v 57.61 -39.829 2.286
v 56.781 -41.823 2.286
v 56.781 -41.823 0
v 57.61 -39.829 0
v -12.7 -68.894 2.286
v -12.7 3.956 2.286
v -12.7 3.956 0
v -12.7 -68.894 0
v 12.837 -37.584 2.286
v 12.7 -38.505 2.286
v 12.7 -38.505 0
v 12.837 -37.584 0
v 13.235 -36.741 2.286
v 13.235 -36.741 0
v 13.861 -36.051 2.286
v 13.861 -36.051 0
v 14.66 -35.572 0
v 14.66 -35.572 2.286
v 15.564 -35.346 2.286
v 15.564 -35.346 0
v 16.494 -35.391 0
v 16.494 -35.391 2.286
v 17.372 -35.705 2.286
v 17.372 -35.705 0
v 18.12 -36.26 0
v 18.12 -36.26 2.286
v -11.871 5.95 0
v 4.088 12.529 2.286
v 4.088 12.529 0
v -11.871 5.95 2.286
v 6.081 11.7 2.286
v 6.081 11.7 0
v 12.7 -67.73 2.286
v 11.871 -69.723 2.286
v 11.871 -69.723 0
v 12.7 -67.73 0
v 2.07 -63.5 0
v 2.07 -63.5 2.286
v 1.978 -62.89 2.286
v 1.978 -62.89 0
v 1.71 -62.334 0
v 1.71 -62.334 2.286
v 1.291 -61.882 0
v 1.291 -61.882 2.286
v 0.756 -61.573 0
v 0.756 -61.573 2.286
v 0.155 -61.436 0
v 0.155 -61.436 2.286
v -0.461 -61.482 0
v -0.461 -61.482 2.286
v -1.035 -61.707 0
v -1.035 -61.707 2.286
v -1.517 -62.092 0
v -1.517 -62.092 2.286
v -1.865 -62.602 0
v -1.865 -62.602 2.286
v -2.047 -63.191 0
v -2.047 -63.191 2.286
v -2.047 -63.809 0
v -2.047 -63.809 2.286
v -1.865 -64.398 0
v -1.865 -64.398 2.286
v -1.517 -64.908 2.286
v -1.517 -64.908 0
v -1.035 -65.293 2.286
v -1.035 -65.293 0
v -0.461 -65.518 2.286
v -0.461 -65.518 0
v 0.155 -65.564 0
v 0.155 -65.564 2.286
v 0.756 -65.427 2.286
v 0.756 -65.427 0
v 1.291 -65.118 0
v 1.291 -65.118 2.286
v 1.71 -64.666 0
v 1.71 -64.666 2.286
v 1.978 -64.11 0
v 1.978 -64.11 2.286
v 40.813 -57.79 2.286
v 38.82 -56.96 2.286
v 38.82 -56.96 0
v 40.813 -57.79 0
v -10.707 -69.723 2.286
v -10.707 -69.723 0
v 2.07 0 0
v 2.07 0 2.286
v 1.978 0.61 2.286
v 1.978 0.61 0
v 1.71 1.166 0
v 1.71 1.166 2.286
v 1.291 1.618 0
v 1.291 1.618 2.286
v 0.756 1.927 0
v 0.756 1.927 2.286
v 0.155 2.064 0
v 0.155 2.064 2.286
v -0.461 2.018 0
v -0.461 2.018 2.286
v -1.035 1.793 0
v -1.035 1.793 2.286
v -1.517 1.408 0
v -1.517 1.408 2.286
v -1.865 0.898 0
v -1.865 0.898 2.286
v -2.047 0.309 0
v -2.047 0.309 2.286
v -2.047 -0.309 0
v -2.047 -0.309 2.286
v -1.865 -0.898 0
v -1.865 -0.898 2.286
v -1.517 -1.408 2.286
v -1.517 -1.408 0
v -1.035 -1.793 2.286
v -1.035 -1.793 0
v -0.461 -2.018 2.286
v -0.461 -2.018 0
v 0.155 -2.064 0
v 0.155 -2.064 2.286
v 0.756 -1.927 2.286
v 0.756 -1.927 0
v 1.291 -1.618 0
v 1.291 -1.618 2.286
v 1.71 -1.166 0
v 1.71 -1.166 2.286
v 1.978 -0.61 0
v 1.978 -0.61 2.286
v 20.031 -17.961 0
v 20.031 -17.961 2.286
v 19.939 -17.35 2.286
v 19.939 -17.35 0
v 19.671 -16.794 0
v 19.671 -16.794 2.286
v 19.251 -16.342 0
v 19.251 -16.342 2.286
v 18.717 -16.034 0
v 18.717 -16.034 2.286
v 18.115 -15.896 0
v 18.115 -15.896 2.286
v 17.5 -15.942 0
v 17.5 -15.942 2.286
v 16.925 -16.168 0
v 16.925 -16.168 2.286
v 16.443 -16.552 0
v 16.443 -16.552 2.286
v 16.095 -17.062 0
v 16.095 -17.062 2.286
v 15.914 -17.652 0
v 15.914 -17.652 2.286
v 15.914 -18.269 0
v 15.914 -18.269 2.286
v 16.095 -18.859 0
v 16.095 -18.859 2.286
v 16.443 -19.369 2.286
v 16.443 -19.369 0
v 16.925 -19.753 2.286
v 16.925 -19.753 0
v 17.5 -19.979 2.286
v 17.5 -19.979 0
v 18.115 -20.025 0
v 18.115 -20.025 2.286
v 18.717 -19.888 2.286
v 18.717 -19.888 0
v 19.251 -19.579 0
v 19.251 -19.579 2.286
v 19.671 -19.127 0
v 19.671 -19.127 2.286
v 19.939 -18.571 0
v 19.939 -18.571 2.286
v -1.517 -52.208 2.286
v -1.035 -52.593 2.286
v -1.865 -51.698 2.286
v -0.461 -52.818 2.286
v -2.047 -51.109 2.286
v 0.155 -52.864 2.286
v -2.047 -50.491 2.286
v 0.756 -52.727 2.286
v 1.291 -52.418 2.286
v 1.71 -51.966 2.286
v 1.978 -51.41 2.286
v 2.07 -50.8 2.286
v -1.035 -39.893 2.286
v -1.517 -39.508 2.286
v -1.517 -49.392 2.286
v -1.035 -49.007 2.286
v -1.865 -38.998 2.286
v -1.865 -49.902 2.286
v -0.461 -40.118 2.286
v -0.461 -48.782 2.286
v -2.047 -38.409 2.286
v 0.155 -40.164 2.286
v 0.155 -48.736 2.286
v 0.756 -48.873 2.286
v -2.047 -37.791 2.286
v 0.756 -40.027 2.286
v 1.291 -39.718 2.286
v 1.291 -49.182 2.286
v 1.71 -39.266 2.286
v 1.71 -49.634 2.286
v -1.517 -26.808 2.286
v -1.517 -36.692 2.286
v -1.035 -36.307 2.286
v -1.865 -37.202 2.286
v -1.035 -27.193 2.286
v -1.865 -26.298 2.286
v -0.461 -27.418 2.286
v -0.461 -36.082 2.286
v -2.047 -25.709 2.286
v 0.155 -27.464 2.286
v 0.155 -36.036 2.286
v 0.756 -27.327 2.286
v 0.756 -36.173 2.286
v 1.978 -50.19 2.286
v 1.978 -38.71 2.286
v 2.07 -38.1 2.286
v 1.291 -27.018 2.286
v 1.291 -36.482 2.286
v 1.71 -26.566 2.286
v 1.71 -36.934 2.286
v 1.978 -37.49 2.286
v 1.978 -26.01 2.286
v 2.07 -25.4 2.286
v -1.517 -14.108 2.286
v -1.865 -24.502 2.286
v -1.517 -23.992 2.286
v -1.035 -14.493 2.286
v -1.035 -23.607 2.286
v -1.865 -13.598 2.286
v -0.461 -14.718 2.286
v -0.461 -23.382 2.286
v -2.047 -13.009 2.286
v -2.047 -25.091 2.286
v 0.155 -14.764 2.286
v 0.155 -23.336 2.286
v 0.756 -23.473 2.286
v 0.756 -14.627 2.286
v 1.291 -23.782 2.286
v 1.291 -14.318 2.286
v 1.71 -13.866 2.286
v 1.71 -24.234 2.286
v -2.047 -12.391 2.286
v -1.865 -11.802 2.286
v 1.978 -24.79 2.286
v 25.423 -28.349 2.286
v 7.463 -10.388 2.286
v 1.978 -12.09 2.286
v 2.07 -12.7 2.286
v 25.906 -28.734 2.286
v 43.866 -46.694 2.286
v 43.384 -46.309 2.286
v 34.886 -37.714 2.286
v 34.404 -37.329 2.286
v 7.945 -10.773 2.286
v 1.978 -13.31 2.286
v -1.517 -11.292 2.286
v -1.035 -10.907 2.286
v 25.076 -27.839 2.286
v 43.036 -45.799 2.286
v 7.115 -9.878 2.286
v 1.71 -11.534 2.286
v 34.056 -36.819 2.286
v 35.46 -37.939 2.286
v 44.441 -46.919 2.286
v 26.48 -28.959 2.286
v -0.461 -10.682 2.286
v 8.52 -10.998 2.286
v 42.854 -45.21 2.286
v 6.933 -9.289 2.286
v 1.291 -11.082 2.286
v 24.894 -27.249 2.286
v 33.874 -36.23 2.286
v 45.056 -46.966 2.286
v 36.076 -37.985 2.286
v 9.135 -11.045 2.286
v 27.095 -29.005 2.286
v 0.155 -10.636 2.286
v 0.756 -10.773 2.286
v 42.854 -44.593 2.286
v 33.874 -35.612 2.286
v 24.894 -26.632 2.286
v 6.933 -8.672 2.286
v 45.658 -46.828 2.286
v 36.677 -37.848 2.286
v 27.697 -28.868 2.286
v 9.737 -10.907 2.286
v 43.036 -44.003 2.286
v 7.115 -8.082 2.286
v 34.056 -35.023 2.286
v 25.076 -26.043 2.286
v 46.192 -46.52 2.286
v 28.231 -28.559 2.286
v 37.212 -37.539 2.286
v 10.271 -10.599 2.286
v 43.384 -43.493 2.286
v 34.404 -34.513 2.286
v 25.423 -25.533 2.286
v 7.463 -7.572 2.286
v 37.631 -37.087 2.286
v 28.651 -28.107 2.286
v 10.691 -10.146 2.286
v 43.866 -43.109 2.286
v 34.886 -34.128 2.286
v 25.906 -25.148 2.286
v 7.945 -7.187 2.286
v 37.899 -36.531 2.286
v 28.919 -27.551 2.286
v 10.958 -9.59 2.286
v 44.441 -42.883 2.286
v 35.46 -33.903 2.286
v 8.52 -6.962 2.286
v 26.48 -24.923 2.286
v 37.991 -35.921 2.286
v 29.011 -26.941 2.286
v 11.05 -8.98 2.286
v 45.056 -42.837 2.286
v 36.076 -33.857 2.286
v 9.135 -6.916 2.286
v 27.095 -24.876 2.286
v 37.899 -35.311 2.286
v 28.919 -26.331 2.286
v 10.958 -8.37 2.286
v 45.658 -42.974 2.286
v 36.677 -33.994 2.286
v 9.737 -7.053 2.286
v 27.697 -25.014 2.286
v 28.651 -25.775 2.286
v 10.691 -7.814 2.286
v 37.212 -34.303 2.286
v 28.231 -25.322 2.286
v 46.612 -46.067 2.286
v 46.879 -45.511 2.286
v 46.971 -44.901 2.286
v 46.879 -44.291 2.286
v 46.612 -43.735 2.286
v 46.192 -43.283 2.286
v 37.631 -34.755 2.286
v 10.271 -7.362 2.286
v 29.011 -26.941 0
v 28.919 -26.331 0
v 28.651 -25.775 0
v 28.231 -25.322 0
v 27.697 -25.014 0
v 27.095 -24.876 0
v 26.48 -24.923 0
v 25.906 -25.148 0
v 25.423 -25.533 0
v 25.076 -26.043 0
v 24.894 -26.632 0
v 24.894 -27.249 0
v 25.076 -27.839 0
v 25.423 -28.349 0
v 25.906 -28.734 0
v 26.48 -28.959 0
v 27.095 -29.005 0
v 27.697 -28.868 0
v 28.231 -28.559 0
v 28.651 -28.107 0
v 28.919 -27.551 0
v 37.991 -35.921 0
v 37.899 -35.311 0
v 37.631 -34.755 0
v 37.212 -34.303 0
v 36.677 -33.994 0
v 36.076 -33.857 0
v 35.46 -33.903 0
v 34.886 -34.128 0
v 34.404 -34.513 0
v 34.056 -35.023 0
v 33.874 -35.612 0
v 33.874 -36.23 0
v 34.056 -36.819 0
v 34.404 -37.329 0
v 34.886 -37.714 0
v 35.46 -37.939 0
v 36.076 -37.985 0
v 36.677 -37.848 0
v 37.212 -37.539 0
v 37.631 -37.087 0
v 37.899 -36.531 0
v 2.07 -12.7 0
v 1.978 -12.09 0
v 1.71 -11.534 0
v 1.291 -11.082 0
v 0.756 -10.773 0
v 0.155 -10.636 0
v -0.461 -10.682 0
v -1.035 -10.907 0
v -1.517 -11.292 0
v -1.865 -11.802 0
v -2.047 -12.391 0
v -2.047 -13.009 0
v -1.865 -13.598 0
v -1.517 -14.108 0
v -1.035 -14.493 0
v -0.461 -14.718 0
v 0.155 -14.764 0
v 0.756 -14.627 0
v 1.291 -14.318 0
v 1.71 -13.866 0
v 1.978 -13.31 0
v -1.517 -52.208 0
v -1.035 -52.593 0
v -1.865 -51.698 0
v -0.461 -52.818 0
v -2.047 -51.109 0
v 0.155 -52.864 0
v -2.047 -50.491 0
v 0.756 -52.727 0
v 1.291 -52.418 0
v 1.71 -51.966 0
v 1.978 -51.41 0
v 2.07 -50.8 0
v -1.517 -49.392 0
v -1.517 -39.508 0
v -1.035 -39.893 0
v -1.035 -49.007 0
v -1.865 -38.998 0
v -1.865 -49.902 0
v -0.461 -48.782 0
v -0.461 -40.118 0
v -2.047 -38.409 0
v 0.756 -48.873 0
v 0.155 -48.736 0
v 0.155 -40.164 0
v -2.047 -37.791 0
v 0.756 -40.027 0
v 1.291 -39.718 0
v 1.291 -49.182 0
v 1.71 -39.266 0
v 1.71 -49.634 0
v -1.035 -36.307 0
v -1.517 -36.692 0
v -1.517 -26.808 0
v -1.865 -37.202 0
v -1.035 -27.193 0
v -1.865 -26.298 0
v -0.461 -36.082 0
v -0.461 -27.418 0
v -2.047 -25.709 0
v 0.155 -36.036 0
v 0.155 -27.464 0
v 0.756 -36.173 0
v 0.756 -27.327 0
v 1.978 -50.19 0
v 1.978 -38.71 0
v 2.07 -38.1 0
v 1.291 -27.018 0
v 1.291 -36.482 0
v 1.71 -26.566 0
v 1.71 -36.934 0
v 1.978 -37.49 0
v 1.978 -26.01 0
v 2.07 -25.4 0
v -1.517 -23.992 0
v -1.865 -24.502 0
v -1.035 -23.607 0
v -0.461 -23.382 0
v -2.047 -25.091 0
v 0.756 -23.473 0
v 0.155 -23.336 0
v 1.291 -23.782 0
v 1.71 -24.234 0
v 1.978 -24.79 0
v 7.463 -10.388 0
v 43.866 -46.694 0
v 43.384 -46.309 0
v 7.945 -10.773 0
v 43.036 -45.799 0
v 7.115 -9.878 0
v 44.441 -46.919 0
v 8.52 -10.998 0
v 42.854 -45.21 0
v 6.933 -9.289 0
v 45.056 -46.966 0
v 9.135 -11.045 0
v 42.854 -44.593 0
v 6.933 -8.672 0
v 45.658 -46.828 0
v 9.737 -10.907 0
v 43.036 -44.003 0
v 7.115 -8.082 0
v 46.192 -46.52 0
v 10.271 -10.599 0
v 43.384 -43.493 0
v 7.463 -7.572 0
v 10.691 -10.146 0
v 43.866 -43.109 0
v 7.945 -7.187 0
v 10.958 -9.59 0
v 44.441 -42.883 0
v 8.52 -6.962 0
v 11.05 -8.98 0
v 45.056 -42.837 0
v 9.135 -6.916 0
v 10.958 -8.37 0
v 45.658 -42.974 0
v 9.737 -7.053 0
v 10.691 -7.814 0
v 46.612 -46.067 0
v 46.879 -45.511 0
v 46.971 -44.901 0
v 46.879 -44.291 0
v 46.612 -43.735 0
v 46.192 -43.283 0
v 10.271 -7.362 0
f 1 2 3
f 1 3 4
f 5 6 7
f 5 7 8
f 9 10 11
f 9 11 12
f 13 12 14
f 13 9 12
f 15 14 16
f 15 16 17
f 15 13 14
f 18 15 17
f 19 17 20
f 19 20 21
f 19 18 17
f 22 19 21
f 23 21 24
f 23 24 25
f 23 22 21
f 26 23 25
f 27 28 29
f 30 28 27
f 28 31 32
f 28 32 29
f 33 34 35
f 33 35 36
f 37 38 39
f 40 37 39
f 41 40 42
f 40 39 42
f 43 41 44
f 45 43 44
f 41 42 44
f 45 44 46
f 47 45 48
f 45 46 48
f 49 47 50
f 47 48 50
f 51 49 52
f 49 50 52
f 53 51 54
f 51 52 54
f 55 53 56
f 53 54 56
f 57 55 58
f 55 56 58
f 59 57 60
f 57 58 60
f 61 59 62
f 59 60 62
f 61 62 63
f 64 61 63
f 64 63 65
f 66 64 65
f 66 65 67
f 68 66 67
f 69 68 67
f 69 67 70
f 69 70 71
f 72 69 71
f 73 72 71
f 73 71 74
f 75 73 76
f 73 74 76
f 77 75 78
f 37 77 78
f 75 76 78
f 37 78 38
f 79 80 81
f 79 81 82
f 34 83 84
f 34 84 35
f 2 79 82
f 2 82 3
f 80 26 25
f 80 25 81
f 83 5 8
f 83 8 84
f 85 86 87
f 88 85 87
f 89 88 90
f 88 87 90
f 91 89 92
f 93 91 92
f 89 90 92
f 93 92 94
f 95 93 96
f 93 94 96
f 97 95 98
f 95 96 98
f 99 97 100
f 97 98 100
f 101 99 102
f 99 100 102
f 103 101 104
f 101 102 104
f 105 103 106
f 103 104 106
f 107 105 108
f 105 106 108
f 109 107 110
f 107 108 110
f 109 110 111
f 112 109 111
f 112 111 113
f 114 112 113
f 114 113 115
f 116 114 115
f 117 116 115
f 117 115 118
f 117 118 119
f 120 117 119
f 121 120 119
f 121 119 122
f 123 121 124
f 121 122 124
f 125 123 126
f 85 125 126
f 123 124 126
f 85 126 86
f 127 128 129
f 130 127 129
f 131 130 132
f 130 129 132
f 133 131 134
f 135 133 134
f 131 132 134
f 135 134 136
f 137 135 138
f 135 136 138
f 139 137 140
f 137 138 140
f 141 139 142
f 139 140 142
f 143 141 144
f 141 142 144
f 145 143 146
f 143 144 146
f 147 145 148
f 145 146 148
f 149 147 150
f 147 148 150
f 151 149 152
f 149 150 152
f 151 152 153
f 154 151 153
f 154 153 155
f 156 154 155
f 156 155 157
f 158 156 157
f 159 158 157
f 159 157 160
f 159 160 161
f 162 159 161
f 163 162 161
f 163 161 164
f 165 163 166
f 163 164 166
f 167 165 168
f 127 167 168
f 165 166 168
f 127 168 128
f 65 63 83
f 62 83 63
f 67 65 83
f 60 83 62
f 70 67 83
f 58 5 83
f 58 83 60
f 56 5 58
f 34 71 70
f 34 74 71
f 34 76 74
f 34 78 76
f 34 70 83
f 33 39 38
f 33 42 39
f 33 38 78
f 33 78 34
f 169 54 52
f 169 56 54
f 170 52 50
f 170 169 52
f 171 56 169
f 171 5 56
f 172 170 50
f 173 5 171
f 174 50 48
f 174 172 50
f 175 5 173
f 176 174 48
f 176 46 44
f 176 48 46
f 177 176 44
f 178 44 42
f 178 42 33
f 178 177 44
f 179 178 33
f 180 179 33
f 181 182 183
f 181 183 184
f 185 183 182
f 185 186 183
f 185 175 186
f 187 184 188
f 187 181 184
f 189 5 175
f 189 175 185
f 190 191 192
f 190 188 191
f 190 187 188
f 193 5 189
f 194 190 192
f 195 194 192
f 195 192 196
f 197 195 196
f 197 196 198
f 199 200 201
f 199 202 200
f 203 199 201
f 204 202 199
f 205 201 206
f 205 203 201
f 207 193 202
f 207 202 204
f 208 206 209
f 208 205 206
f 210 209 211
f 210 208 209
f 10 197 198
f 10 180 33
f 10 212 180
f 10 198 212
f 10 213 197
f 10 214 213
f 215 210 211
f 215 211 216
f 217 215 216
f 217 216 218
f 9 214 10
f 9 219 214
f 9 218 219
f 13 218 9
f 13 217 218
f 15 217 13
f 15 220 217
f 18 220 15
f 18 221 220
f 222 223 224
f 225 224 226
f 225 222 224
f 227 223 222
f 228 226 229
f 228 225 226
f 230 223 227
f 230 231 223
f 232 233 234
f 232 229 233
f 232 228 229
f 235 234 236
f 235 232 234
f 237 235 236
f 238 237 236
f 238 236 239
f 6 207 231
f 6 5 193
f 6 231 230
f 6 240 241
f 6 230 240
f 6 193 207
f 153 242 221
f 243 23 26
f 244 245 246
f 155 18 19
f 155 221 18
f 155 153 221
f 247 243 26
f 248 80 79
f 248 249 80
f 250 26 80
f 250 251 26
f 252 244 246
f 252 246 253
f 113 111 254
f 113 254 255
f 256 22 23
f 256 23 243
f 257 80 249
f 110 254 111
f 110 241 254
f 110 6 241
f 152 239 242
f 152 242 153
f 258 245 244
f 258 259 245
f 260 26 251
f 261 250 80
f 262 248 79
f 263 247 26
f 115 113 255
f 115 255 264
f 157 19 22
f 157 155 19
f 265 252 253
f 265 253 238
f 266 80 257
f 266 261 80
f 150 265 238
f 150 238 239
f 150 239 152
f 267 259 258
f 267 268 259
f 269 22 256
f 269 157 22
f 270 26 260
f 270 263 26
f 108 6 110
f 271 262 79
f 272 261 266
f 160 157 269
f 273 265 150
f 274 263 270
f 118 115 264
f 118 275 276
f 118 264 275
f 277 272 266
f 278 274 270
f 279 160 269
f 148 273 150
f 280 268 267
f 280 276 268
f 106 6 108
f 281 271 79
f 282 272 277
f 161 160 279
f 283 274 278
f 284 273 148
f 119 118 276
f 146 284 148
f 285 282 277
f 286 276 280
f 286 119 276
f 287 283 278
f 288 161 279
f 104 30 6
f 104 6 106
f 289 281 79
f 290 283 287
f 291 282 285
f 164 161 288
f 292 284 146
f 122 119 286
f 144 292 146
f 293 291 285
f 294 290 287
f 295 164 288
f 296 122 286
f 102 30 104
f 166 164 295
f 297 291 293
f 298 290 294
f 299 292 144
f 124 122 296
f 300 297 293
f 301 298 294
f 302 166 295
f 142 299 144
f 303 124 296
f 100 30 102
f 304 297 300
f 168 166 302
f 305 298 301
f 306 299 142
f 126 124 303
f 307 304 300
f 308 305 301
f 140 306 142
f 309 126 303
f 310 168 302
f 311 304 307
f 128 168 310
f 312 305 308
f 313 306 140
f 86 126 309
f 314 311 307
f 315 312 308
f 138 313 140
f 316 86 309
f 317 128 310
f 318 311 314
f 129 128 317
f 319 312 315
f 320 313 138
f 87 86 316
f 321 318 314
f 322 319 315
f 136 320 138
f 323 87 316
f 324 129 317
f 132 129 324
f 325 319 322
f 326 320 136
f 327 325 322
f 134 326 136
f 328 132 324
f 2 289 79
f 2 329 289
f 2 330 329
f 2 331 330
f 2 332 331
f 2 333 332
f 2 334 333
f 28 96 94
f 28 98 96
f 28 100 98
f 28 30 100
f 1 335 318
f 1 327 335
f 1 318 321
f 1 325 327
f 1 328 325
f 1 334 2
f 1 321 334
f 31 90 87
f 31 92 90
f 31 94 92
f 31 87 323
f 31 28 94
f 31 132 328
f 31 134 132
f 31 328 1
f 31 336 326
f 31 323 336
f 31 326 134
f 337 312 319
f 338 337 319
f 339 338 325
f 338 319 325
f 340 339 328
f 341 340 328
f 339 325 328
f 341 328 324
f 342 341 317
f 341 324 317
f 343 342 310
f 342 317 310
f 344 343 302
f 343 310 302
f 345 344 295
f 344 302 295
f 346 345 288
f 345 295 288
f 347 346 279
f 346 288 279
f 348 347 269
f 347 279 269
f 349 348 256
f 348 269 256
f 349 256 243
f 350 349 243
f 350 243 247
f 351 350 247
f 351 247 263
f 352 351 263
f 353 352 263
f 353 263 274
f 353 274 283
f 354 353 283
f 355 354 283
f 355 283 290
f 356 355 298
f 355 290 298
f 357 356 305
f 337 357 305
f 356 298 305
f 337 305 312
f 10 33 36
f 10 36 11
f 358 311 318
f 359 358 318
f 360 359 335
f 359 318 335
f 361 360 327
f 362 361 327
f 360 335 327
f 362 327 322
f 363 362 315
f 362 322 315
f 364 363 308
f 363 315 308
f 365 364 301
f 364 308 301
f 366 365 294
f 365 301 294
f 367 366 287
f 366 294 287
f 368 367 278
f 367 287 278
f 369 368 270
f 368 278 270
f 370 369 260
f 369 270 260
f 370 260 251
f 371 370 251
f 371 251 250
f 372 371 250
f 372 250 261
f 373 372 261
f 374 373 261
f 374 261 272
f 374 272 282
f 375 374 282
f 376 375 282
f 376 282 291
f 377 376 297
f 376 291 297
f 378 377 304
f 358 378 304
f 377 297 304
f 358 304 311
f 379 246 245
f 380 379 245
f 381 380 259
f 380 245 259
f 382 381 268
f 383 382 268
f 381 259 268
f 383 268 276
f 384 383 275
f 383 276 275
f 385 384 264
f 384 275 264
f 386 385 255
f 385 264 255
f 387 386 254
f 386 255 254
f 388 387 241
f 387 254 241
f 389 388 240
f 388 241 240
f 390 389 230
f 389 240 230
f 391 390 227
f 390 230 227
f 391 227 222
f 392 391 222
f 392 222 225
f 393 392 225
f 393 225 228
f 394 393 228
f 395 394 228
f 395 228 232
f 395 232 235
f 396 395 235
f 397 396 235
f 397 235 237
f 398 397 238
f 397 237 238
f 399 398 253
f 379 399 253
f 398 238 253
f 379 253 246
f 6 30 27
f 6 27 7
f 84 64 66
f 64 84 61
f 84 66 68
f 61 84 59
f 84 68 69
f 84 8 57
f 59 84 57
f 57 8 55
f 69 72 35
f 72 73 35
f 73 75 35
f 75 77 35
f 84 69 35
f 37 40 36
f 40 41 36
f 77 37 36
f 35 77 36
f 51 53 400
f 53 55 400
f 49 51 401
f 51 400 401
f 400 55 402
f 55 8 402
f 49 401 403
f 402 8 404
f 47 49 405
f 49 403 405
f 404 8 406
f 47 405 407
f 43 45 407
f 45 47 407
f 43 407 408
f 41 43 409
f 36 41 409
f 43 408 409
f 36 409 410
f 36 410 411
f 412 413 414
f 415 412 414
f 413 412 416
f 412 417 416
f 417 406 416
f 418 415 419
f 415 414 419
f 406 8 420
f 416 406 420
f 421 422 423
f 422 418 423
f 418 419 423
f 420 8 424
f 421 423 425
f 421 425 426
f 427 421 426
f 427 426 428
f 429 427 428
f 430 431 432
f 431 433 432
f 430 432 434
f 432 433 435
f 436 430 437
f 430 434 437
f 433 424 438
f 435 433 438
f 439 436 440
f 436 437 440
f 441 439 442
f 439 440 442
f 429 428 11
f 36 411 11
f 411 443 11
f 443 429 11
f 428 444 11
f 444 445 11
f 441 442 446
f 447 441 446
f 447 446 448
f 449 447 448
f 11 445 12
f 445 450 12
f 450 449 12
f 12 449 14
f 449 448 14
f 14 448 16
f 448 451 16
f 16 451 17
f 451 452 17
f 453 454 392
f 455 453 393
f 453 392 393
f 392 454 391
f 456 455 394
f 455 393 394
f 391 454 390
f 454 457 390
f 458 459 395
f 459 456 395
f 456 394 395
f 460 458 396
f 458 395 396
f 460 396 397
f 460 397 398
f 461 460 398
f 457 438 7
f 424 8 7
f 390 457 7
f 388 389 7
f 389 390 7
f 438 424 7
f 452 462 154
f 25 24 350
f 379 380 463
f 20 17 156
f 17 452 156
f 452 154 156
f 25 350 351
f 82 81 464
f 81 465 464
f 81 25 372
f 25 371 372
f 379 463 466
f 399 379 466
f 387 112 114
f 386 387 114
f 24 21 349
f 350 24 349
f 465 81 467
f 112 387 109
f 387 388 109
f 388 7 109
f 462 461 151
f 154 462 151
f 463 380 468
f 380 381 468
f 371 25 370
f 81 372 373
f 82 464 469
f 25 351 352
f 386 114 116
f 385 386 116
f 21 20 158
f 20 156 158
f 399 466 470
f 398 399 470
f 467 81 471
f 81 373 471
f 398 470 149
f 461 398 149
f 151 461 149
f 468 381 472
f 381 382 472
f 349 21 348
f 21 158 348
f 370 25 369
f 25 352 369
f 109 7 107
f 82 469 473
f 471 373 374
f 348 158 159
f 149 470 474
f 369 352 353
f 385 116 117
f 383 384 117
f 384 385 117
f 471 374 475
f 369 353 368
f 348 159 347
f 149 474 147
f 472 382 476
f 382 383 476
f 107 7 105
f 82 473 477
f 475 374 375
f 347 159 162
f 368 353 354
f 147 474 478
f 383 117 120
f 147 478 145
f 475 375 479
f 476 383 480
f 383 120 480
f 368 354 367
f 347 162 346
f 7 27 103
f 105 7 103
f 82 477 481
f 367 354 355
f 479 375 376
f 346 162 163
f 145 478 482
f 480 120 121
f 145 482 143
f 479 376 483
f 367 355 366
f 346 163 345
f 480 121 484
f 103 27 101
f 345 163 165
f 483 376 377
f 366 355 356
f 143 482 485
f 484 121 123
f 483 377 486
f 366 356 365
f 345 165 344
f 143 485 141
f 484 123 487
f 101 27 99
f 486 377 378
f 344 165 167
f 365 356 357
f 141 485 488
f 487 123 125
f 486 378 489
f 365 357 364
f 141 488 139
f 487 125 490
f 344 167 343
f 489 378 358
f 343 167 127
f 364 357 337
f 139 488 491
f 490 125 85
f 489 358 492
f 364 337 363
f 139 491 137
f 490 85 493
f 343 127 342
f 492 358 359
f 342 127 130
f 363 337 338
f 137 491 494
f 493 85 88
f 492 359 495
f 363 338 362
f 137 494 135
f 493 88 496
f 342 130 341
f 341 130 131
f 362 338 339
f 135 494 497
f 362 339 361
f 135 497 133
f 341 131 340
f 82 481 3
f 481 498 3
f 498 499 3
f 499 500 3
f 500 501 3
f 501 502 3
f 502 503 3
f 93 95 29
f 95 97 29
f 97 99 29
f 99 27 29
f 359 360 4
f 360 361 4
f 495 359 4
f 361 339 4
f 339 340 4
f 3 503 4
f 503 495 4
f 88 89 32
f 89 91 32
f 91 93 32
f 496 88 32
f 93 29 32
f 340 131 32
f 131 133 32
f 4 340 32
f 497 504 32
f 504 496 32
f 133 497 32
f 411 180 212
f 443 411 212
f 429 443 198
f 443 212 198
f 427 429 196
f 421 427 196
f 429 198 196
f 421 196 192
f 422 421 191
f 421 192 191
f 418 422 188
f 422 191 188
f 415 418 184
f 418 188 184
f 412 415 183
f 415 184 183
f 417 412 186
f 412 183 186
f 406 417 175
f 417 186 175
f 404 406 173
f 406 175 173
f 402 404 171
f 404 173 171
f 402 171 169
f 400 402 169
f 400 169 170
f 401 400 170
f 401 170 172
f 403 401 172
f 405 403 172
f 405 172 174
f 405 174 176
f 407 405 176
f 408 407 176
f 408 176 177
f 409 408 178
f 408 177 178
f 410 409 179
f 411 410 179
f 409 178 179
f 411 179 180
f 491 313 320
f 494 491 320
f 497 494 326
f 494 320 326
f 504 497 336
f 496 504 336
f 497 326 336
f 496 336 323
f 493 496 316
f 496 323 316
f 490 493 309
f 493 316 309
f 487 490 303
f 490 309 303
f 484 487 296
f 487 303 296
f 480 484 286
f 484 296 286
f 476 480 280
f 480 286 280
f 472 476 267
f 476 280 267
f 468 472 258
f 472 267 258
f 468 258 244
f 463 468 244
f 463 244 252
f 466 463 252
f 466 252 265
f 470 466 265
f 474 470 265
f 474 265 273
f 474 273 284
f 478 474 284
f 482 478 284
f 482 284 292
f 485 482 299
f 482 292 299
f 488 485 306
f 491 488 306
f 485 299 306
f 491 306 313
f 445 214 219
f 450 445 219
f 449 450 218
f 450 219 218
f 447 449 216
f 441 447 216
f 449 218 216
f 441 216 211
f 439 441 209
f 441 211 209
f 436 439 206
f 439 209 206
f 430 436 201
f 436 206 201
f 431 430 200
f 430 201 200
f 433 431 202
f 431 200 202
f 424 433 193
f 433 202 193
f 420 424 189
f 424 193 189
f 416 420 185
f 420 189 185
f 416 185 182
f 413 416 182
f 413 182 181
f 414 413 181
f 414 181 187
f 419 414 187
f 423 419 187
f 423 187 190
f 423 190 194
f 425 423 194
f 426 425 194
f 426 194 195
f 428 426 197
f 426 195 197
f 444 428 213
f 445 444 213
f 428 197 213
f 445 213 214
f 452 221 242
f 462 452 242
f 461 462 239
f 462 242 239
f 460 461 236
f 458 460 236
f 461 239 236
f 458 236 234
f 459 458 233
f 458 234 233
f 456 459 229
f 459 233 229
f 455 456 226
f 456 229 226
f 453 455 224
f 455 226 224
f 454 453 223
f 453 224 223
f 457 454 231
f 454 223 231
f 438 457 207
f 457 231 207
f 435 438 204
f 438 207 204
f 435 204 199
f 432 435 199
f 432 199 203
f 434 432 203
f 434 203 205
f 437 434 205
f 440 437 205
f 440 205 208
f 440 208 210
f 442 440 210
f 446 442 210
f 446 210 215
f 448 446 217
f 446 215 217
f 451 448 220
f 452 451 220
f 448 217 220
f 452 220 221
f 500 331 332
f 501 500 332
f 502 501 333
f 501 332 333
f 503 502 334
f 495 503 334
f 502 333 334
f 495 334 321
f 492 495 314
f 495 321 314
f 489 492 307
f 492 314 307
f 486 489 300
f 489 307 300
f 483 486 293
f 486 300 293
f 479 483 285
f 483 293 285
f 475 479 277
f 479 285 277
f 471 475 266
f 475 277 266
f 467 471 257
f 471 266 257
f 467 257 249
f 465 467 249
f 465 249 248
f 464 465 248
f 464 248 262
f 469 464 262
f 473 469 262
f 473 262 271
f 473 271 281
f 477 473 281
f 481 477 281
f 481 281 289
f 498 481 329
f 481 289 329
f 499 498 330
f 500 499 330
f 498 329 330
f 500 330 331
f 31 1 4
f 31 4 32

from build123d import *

# Parameters (mm, degrees)
SKETCH1_R           = 2.0701
BOSS_EXTRUDE1_DEPTH = 2.286


with BuildPart() as part:
    # Sketch1 → Boss-Extrude1 (new body)
    with BuildSketch(Plane.XY.offset(2.286)):
        with BuildLine():
            Line((-12.7, 3.956428413), (-12.7, -68.893532285))
            Line((-12.7, -68.893532285), (-10.706695129, -69.723))
            Line((-10.706695129, -69.723), (11.870532285, -69.723))
            Line((11.870532285, -69.723), (12.7, -67.729695129))
            Line((12.7, -67.729695129), (12.7, -38.505245425))
            ThreePointArc((12.7, -38.505245425), (14.659980102, -35.571927909), (18.12006403, -36.260181395))
            Line((18.12006403, -36.260181395), (38.820161129, -56.960278494))
            Line((38.820161129, -56.960278494), (40.813466, -57.789746209))
            Line((40.813466, -57.789746209), (56.780673371, -41.822538838))
            Line((56.780673371, -41.822538838), (57.610141086, -39.829233967))
            Line((57.610141086, -39.829233967), (6.081013492, 11.699893628))
            Line((6.081013492, 11.699893628), (4.087708621, 12.529361343))
            Line((4.087708621, 12.529361343), (-11.870532285, 5.949733284))
            Line((-11.870532285, 5.949733284), (-12.7, 3.956428413))
        make_face()
        with Locations((0, -63.5)):
            Circle(SKETCH1_R, mode=Mode.SUBTRACT)
        with Locations((35.921024484, -35.921024484)):
            Circle(SKETCH1_R, mode=Mode.SUBTRACT)
        with Locations((17.960512242, -17.960512242)):
            Circle(SKETCH1_R, mode=Mode.SUBTRACT)
        with Locations((0, -38.1)):
            Circle(SKETCH1_R, mode=Mode.SUBTRACT)
        with Locations((0, -12.7)):
            Circle(SKETCH1_R, mode=Mode.SUBTRACT)
        Circle(SKETCH1_R, mode=Mode.SUBTRACT)
        with Locations((8.980256121, -8.980256121)):
            Circle(SKETCH1_R, mode=Mode.SUBTRACT)
        with Locations((0, -25.4)):
            Circle(SKETCH1_R, mode=Mode.SUBTRACT)
        with Locations((0, -50.8)):
            Circle(SKETCH1_R, mode=Mode.SUBTRACT)
        with Locations((26.940768363, -26.940768363)):
            Circle(SKETCH1_R, mode=Mode.SUBTRACT)
        with Locations((44.901280605, -44.901280605)):
            Circle(SKETCH1_R, mode=Mode.SUBTRACT)
    extrude(amount=-BOSS_EXTRUDE1_DEPTH)


solid = part.part
